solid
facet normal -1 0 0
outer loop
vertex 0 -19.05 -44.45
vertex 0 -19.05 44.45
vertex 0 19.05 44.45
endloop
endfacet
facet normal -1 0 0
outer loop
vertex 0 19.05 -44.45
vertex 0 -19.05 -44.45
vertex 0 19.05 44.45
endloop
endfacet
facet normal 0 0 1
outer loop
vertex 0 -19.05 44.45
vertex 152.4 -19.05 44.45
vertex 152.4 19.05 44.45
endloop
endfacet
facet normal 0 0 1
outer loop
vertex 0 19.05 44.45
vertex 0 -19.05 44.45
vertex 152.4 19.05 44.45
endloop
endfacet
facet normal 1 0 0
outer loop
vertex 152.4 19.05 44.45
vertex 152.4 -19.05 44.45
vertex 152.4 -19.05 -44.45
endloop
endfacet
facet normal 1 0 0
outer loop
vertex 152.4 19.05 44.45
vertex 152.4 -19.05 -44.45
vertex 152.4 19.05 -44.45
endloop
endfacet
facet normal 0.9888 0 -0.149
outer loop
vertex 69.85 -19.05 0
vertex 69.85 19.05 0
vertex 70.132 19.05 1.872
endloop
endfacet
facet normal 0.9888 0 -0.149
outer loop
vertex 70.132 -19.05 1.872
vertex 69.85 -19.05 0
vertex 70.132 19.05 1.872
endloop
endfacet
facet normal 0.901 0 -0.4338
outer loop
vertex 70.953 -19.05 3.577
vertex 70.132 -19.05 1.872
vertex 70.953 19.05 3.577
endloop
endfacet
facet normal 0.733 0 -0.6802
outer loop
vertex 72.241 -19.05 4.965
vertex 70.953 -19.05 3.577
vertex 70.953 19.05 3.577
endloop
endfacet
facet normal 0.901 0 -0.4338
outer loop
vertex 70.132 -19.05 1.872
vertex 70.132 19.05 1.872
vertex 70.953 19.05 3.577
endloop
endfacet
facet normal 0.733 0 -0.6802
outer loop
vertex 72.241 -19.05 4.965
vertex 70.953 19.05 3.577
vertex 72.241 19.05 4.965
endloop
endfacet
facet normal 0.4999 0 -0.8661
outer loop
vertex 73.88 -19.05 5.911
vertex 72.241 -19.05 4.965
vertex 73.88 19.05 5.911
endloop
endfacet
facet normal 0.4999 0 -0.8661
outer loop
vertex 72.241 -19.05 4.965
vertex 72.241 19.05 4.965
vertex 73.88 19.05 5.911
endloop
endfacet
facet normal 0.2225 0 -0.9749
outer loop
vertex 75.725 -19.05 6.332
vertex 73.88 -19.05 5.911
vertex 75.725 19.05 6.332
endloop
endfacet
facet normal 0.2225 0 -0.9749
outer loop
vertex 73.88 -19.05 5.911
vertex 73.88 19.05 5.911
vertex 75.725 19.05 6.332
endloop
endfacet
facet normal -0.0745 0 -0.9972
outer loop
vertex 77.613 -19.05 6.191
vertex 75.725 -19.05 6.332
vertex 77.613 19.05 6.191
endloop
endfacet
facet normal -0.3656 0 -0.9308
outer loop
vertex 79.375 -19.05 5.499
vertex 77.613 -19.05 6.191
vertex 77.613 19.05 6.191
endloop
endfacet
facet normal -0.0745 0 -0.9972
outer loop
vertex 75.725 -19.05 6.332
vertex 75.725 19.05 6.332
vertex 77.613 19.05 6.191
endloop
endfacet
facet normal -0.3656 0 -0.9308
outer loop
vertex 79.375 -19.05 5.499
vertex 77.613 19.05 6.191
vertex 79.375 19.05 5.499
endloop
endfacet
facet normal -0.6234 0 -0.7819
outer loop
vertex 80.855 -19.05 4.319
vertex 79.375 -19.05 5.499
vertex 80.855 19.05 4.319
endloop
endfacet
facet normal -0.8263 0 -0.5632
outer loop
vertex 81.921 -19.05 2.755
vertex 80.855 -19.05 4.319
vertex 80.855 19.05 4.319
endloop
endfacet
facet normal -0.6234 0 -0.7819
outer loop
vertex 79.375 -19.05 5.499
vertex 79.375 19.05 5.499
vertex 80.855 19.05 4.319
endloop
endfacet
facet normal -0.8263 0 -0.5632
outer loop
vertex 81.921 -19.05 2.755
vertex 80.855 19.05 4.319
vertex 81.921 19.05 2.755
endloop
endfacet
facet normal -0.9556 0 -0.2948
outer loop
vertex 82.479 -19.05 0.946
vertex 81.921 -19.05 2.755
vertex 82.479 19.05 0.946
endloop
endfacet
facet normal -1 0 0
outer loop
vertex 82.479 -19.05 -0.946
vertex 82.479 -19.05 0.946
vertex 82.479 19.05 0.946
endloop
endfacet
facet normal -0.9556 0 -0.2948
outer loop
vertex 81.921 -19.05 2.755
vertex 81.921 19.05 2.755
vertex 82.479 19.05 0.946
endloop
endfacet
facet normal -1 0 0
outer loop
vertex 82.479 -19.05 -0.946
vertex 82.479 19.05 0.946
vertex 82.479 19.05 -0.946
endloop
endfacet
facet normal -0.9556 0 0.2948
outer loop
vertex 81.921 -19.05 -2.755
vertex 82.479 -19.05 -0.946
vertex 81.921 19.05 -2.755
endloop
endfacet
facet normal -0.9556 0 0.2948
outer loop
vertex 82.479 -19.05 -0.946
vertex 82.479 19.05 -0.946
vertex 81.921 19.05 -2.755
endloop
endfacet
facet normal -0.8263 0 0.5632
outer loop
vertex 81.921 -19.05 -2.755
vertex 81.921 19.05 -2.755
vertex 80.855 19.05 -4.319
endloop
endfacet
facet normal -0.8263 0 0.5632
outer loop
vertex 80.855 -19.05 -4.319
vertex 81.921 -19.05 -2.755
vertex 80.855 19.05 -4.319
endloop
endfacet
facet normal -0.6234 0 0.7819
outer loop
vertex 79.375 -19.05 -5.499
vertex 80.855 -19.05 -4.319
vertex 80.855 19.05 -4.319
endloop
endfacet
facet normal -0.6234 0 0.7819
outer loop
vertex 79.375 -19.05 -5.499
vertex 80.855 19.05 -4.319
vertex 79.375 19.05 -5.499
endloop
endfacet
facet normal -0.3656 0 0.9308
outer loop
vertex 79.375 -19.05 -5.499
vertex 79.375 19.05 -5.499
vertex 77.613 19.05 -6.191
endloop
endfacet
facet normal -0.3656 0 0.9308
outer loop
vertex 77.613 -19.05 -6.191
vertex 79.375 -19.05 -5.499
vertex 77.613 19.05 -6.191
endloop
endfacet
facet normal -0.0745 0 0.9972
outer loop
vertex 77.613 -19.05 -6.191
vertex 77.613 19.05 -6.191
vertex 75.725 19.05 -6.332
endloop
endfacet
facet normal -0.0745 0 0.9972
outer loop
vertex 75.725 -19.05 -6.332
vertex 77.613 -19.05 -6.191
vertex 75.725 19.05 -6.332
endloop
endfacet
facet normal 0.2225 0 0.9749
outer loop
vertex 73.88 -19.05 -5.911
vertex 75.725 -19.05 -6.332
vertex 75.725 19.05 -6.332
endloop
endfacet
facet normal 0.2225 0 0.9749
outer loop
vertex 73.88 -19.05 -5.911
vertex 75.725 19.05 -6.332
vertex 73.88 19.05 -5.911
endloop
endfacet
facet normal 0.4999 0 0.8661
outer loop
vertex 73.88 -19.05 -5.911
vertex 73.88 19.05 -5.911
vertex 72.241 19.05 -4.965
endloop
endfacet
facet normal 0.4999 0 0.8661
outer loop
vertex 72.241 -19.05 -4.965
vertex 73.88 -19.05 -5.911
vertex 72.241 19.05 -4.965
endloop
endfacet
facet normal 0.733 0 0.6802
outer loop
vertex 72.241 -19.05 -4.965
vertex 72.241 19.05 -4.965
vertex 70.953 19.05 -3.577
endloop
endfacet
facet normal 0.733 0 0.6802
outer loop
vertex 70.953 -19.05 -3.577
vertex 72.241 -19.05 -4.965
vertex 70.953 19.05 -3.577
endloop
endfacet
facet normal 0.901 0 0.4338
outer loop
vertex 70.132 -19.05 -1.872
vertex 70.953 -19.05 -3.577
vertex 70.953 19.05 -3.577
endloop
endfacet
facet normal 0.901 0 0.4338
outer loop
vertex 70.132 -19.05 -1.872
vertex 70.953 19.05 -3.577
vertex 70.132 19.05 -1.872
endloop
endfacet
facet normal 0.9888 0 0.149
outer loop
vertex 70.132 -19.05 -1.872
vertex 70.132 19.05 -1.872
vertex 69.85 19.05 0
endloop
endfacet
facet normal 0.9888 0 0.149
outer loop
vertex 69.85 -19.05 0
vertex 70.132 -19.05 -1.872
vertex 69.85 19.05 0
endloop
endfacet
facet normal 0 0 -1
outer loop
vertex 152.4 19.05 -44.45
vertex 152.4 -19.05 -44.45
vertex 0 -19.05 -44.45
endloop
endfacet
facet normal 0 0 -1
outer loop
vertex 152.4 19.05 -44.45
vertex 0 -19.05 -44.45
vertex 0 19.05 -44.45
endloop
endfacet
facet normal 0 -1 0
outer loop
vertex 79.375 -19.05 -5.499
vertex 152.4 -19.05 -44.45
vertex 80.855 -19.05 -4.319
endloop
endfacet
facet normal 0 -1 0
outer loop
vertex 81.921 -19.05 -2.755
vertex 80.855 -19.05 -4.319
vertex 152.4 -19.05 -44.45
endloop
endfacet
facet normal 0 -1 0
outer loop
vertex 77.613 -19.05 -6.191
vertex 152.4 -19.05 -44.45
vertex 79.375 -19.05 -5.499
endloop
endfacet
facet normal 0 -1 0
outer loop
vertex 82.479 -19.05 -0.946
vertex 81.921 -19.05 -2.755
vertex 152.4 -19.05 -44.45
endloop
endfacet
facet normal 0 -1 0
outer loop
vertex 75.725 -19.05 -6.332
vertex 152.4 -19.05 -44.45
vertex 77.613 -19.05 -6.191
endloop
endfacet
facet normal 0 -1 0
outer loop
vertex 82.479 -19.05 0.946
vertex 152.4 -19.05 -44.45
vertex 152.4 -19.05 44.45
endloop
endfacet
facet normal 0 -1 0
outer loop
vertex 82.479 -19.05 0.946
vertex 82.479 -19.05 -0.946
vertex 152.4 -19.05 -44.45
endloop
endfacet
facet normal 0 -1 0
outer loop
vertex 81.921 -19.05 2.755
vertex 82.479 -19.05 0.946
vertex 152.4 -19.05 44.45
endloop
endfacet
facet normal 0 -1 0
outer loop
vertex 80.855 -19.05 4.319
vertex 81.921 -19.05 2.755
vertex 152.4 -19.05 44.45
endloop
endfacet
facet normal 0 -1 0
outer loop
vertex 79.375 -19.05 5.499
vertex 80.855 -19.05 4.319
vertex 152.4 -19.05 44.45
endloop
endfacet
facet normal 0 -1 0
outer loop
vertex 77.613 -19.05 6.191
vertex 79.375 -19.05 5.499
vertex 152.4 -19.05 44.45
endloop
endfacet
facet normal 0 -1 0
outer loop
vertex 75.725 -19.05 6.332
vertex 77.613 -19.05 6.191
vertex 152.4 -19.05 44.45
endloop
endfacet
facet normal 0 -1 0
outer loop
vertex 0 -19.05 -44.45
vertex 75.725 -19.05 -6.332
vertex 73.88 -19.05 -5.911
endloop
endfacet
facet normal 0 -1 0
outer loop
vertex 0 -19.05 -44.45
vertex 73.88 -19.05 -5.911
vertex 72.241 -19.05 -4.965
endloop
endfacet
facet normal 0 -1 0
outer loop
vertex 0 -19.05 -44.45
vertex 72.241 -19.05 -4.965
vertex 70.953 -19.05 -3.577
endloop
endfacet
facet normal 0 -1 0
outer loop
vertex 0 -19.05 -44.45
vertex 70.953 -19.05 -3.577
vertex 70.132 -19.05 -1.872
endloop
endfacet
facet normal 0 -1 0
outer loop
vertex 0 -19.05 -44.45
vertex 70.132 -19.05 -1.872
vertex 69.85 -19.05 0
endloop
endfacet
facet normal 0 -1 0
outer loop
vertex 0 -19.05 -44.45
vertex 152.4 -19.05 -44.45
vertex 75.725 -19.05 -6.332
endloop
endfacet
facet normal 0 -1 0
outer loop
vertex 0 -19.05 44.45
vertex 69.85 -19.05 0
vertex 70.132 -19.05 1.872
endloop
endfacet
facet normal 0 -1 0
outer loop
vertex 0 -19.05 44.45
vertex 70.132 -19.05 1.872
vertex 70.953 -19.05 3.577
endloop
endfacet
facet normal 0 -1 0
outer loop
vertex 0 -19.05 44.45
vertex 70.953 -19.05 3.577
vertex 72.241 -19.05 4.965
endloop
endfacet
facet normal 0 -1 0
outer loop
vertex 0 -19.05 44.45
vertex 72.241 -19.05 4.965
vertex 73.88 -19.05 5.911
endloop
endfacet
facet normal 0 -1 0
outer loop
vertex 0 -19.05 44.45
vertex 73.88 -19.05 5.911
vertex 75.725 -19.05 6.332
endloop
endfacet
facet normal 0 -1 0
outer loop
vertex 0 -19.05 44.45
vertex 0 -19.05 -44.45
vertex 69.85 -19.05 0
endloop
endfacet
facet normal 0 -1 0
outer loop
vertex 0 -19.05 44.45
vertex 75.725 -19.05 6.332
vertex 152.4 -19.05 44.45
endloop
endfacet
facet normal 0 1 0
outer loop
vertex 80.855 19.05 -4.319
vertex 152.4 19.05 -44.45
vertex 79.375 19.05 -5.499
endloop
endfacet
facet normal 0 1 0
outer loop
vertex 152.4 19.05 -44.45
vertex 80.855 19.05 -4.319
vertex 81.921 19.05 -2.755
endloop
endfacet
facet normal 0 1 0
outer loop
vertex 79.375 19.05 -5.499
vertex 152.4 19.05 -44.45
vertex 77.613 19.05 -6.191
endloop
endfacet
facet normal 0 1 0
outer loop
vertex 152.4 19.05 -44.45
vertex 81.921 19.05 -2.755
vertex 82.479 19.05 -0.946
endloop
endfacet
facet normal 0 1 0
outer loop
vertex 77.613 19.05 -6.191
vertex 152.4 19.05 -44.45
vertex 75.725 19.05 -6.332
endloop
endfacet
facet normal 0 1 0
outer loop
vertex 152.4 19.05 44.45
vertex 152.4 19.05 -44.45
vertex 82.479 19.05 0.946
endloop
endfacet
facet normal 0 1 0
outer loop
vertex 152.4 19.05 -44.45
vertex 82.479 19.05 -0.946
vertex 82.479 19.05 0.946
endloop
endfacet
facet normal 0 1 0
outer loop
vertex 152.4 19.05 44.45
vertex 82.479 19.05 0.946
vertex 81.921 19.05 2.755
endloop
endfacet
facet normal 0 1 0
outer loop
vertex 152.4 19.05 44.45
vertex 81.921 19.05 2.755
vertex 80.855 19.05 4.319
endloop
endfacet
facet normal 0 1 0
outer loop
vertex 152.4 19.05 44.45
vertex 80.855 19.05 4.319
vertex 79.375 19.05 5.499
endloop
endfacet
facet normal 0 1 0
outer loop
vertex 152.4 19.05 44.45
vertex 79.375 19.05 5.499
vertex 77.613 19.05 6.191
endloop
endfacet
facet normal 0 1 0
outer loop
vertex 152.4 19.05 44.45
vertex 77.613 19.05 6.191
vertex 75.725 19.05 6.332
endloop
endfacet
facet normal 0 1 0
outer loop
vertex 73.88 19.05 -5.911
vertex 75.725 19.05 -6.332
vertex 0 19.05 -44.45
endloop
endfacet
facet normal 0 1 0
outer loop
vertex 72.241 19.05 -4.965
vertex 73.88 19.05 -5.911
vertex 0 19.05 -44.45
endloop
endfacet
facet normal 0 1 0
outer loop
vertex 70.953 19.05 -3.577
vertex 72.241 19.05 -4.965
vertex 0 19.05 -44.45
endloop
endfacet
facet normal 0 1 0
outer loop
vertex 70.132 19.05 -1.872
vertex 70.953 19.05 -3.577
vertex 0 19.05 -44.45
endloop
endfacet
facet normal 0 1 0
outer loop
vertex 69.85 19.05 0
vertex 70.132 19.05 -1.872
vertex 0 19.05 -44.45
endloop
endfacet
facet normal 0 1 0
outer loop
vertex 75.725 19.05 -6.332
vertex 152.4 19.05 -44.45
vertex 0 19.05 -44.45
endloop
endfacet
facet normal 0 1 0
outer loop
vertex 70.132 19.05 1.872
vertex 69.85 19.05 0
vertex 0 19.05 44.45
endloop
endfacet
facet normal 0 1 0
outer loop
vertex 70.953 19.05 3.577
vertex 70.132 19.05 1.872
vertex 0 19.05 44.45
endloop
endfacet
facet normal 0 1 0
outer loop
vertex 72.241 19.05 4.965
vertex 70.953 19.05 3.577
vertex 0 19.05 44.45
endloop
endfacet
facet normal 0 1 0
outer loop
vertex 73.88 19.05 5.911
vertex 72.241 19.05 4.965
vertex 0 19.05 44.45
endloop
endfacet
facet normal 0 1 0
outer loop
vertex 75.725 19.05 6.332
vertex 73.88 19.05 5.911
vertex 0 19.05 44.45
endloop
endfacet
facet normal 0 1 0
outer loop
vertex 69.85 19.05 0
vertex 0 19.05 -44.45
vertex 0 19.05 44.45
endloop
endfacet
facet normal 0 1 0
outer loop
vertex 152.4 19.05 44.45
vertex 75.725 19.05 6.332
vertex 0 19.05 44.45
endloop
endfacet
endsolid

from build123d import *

# Parameters (mm, degrees)
F0_W     = 38.1
F0_H     = 88.9
F1_DEPTH = 152.4
F3_D     = 12.7


# Not quite as in the source:
# - a feature of the source that left no trace in its solid (it failed there, or was rolled back) is left out
# - a length typed as a fraction of an inch, garbled in the dataset ("3 / 203.2 mm" for 3/8 in), is restored


with BuildPart() as f1:
    # F0 (on Right) → F1 (new body)
    with BuildSketch(Plane.YZ):
        Rectangle(F0_W, F0_H)
    extrude(amount=F1_DEPTH)

    # F3 (through all)
    with Locations(Plane.XZ.offset(19.05)):
        with Locations((76.2, 0)):
            Hole(F3_D / 2)


solid = f1.part
